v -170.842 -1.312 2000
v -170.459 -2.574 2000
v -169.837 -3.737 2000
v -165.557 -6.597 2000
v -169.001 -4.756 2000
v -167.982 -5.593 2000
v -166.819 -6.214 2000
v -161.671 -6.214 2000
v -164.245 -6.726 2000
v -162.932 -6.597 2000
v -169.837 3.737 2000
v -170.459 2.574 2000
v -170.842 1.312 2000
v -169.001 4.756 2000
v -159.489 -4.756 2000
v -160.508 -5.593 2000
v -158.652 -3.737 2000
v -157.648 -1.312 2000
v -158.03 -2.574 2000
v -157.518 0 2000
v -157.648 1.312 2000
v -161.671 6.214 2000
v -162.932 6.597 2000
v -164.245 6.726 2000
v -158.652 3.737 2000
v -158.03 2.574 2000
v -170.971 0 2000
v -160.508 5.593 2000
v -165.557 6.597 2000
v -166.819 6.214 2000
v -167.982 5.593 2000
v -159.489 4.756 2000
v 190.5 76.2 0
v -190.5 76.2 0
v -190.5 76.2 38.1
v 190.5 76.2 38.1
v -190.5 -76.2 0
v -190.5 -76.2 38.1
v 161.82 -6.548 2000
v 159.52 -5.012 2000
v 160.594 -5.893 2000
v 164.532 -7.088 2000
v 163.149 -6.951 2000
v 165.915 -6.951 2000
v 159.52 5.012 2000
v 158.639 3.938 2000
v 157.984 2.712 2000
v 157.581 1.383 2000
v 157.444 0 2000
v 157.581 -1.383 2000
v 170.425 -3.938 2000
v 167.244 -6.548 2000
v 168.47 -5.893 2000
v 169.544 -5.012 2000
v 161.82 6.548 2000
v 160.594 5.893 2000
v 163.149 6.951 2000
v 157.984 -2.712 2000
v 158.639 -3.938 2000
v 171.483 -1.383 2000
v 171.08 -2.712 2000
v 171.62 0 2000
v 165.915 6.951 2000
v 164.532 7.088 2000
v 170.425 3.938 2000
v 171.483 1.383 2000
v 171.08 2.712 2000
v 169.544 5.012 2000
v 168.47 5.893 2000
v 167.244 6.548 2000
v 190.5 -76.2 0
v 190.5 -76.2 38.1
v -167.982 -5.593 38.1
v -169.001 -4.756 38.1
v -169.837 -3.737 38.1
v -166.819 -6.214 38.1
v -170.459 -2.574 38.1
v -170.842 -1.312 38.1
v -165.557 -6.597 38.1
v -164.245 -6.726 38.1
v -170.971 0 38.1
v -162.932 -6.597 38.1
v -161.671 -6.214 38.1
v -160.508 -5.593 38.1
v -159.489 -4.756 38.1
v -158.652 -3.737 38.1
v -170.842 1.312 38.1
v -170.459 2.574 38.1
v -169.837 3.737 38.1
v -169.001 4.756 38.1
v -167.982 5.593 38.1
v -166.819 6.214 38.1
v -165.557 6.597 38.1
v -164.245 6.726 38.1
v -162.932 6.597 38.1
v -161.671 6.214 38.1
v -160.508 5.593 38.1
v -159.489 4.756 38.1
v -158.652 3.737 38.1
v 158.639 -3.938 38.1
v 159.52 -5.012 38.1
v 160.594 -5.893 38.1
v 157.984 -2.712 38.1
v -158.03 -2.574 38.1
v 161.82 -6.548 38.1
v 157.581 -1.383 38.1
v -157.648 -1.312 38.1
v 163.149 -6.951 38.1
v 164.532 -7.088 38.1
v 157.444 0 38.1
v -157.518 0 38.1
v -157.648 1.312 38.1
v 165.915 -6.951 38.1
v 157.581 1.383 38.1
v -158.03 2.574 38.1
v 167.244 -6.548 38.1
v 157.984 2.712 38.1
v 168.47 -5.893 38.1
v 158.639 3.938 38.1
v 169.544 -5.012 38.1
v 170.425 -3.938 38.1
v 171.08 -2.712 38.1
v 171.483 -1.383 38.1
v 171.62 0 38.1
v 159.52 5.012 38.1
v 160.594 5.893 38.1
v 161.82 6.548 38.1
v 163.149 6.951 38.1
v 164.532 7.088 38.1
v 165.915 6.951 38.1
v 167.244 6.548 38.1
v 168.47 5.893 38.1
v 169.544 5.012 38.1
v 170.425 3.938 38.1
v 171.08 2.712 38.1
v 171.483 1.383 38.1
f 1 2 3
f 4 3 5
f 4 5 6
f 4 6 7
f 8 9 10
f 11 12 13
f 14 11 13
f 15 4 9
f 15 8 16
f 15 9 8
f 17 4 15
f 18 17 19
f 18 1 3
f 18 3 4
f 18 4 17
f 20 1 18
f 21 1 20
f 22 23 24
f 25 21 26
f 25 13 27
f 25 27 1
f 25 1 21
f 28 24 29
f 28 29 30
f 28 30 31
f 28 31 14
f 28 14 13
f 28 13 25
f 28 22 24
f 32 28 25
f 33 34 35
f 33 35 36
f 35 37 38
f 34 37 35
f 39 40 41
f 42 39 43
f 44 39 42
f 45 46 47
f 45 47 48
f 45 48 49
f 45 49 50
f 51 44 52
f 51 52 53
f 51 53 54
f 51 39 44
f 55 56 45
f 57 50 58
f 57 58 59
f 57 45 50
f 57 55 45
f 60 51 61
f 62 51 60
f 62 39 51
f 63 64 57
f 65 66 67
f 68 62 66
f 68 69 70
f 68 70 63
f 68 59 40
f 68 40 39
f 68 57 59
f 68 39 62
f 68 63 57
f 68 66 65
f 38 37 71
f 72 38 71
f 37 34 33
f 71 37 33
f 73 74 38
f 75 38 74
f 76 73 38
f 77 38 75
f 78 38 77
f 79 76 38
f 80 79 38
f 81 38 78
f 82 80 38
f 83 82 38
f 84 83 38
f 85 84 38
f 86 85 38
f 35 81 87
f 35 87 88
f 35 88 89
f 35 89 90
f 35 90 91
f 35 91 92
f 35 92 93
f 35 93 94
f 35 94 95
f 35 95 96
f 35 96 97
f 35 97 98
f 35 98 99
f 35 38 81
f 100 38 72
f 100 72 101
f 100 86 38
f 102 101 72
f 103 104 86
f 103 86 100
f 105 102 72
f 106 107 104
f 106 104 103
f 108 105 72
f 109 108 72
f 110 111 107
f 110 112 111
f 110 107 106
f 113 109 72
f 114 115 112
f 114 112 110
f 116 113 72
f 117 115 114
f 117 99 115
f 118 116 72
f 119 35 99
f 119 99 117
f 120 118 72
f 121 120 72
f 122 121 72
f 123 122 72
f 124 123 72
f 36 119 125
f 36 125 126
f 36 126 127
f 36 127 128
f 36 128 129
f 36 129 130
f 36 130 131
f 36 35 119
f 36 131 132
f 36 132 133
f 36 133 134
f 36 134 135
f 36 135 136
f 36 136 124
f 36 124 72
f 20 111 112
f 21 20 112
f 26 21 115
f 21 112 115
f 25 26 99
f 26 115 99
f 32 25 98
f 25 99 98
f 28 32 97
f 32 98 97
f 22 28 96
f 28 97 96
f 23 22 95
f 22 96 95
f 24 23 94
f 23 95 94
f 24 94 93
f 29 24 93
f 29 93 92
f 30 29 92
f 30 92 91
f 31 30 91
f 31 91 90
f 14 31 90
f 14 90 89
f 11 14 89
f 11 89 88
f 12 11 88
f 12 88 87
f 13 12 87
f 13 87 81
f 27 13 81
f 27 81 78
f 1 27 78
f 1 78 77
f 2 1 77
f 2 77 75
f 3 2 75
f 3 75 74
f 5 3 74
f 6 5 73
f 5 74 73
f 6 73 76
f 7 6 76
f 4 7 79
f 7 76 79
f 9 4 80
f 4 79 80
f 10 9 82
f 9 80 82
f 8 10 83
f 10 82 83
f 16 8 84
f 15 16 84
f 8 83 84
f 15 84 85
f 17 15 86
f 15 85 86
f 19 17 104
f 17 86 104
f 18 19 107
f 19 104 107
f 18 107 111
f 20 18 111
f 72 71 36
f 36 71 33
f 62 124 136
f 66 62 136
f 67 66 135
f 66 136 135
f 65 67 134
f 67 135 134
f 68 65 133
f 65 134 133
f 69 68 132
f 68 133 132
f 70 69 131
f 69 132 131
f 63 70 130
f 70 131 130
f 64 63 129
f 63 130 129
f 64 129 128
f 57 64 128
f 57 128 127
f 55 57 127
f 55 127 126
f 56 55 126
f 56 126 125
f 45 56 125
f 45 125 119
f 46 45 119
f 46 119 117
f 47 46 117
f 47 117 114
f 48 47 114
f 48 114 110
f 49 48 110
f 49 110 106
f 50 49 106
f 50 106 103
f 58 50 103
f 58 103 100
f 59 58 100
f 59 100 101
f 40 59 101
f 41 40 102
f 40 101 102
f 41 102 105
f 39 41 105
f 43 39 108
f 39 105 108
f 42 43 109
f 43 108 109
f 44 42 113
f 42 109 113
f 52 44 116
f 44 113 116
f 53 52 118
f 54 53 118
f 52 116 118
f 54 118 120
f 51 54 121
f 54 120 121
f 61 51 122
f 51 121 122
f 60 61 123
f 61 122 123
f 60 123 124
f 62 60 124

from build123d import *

# Parameters (mm, degrees)
F0_W     = 381
F0_H     = 152.4
F1_DEPTH = 38.1
F2_R     = 6.726228
F4_DEPTH = 2000
F3_R     = 7.08762
F5_DEPTH = 2000


with BuildPart() as f1:
    # F0 (on Top) → F1 (new body)
    with BuildSketch(Plane.XY):
        Rectangle(F0_W, F0_H)
    extrude(amount=F1_DEPTH)

    # F2 (on Top) → F4 (join)
    with BuildSketch(Plane.XY):
        with Locations((-164.244667, 0)):
            Circle(F2_R)
    extrude(amount=F4_DEPTH)

    # F3 (on Top) → F5 (join)
    with BuildSketch(Plane.XY):
        with Locations((164.532065, 0)):
            Circle(F3_R)
    extrude(amount=F5_DEPTH)


solid = f1.part
